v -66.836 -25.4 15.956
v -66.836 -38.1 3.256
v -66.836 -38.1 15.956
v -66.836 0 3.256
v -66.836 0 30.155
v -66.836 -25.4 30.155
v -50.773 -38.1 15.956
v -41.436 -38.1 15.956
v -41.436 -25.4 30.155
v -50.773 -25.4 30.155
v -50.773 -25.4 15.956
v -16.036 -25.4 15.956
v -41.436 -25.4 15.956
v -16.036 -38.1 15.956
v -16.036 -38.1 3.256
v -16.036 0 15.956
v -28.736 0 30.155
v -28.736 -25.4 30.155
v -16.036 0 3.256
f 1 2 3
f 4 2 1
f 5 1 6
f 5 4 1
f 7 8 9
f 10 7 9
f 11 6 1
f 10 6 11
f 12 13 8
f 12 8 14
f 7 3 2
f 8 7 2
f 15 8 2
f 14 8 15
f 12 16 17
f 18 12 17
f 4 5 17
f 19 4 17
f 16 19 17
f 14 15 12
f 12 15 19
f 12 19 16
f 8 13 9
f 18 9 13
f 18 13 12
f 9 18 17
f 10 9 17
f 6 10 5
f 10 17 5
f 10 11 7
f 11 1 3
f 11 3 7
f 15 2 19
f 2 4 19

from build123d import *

# Parameters (mm, degrees)
F1_DEPTH = 25.4
F2_W     = 50.8
F2_H     = 12.7
F3_DEPTH = 12.7
F4_W     = 9.3365699251
F4_H     = 14.1990316571
F5_DEPTH = 12.7
F7_DEPTH = 25.4


# Not quite as in the source:
# - a feature names something its author has since deleted; it is built from what else it names


with BuildPart() as f1:
    # F0 (on Front) → F1 (new body)
    with BuildSketch(Plane.XZ):
        Polygon((-66.8362646442, 30.1552314789), (-66.8362646442, 3.2561998218), (-16.0362646442, 3.2561998218), (-16.0362646442, 15.9561998218), (-28.7362646442, 30.1552314789), align=None)
    extrude(amount=F1_DEPTH)

    # F2 (on face) → F3 (join)
    with BuildSketch(Plane.XZ.offset(25.4)):
        with Locations((-41.4362646442, 9.6061998218)):
            Rectangle(F2_W, F2_H)
    extrude(amount=F3_DEPTH)

    # F4 (on face) → F5 (join)
    with BuildSketch(Plane.XZ.offset(25.4)):
        with Locations((-46.1045496067, 23.0557156503)):
            Rectangle(F4_W, F4_H)
    extrude(amount=F5_DEPTH)

    # F6 (on face) → F7 (cut)
    with BuildSketch(Plane.YZ.offset(-41.4362646442)):
        Polygon((-38.1, 15.9561998218), (-25.4, 30.1552314789), (-38.1, 30.1552314789), align=None)
    extrude(amount=-F7_DEPTH, mode=Mode.SUBTRACT)


solid = f1.part
